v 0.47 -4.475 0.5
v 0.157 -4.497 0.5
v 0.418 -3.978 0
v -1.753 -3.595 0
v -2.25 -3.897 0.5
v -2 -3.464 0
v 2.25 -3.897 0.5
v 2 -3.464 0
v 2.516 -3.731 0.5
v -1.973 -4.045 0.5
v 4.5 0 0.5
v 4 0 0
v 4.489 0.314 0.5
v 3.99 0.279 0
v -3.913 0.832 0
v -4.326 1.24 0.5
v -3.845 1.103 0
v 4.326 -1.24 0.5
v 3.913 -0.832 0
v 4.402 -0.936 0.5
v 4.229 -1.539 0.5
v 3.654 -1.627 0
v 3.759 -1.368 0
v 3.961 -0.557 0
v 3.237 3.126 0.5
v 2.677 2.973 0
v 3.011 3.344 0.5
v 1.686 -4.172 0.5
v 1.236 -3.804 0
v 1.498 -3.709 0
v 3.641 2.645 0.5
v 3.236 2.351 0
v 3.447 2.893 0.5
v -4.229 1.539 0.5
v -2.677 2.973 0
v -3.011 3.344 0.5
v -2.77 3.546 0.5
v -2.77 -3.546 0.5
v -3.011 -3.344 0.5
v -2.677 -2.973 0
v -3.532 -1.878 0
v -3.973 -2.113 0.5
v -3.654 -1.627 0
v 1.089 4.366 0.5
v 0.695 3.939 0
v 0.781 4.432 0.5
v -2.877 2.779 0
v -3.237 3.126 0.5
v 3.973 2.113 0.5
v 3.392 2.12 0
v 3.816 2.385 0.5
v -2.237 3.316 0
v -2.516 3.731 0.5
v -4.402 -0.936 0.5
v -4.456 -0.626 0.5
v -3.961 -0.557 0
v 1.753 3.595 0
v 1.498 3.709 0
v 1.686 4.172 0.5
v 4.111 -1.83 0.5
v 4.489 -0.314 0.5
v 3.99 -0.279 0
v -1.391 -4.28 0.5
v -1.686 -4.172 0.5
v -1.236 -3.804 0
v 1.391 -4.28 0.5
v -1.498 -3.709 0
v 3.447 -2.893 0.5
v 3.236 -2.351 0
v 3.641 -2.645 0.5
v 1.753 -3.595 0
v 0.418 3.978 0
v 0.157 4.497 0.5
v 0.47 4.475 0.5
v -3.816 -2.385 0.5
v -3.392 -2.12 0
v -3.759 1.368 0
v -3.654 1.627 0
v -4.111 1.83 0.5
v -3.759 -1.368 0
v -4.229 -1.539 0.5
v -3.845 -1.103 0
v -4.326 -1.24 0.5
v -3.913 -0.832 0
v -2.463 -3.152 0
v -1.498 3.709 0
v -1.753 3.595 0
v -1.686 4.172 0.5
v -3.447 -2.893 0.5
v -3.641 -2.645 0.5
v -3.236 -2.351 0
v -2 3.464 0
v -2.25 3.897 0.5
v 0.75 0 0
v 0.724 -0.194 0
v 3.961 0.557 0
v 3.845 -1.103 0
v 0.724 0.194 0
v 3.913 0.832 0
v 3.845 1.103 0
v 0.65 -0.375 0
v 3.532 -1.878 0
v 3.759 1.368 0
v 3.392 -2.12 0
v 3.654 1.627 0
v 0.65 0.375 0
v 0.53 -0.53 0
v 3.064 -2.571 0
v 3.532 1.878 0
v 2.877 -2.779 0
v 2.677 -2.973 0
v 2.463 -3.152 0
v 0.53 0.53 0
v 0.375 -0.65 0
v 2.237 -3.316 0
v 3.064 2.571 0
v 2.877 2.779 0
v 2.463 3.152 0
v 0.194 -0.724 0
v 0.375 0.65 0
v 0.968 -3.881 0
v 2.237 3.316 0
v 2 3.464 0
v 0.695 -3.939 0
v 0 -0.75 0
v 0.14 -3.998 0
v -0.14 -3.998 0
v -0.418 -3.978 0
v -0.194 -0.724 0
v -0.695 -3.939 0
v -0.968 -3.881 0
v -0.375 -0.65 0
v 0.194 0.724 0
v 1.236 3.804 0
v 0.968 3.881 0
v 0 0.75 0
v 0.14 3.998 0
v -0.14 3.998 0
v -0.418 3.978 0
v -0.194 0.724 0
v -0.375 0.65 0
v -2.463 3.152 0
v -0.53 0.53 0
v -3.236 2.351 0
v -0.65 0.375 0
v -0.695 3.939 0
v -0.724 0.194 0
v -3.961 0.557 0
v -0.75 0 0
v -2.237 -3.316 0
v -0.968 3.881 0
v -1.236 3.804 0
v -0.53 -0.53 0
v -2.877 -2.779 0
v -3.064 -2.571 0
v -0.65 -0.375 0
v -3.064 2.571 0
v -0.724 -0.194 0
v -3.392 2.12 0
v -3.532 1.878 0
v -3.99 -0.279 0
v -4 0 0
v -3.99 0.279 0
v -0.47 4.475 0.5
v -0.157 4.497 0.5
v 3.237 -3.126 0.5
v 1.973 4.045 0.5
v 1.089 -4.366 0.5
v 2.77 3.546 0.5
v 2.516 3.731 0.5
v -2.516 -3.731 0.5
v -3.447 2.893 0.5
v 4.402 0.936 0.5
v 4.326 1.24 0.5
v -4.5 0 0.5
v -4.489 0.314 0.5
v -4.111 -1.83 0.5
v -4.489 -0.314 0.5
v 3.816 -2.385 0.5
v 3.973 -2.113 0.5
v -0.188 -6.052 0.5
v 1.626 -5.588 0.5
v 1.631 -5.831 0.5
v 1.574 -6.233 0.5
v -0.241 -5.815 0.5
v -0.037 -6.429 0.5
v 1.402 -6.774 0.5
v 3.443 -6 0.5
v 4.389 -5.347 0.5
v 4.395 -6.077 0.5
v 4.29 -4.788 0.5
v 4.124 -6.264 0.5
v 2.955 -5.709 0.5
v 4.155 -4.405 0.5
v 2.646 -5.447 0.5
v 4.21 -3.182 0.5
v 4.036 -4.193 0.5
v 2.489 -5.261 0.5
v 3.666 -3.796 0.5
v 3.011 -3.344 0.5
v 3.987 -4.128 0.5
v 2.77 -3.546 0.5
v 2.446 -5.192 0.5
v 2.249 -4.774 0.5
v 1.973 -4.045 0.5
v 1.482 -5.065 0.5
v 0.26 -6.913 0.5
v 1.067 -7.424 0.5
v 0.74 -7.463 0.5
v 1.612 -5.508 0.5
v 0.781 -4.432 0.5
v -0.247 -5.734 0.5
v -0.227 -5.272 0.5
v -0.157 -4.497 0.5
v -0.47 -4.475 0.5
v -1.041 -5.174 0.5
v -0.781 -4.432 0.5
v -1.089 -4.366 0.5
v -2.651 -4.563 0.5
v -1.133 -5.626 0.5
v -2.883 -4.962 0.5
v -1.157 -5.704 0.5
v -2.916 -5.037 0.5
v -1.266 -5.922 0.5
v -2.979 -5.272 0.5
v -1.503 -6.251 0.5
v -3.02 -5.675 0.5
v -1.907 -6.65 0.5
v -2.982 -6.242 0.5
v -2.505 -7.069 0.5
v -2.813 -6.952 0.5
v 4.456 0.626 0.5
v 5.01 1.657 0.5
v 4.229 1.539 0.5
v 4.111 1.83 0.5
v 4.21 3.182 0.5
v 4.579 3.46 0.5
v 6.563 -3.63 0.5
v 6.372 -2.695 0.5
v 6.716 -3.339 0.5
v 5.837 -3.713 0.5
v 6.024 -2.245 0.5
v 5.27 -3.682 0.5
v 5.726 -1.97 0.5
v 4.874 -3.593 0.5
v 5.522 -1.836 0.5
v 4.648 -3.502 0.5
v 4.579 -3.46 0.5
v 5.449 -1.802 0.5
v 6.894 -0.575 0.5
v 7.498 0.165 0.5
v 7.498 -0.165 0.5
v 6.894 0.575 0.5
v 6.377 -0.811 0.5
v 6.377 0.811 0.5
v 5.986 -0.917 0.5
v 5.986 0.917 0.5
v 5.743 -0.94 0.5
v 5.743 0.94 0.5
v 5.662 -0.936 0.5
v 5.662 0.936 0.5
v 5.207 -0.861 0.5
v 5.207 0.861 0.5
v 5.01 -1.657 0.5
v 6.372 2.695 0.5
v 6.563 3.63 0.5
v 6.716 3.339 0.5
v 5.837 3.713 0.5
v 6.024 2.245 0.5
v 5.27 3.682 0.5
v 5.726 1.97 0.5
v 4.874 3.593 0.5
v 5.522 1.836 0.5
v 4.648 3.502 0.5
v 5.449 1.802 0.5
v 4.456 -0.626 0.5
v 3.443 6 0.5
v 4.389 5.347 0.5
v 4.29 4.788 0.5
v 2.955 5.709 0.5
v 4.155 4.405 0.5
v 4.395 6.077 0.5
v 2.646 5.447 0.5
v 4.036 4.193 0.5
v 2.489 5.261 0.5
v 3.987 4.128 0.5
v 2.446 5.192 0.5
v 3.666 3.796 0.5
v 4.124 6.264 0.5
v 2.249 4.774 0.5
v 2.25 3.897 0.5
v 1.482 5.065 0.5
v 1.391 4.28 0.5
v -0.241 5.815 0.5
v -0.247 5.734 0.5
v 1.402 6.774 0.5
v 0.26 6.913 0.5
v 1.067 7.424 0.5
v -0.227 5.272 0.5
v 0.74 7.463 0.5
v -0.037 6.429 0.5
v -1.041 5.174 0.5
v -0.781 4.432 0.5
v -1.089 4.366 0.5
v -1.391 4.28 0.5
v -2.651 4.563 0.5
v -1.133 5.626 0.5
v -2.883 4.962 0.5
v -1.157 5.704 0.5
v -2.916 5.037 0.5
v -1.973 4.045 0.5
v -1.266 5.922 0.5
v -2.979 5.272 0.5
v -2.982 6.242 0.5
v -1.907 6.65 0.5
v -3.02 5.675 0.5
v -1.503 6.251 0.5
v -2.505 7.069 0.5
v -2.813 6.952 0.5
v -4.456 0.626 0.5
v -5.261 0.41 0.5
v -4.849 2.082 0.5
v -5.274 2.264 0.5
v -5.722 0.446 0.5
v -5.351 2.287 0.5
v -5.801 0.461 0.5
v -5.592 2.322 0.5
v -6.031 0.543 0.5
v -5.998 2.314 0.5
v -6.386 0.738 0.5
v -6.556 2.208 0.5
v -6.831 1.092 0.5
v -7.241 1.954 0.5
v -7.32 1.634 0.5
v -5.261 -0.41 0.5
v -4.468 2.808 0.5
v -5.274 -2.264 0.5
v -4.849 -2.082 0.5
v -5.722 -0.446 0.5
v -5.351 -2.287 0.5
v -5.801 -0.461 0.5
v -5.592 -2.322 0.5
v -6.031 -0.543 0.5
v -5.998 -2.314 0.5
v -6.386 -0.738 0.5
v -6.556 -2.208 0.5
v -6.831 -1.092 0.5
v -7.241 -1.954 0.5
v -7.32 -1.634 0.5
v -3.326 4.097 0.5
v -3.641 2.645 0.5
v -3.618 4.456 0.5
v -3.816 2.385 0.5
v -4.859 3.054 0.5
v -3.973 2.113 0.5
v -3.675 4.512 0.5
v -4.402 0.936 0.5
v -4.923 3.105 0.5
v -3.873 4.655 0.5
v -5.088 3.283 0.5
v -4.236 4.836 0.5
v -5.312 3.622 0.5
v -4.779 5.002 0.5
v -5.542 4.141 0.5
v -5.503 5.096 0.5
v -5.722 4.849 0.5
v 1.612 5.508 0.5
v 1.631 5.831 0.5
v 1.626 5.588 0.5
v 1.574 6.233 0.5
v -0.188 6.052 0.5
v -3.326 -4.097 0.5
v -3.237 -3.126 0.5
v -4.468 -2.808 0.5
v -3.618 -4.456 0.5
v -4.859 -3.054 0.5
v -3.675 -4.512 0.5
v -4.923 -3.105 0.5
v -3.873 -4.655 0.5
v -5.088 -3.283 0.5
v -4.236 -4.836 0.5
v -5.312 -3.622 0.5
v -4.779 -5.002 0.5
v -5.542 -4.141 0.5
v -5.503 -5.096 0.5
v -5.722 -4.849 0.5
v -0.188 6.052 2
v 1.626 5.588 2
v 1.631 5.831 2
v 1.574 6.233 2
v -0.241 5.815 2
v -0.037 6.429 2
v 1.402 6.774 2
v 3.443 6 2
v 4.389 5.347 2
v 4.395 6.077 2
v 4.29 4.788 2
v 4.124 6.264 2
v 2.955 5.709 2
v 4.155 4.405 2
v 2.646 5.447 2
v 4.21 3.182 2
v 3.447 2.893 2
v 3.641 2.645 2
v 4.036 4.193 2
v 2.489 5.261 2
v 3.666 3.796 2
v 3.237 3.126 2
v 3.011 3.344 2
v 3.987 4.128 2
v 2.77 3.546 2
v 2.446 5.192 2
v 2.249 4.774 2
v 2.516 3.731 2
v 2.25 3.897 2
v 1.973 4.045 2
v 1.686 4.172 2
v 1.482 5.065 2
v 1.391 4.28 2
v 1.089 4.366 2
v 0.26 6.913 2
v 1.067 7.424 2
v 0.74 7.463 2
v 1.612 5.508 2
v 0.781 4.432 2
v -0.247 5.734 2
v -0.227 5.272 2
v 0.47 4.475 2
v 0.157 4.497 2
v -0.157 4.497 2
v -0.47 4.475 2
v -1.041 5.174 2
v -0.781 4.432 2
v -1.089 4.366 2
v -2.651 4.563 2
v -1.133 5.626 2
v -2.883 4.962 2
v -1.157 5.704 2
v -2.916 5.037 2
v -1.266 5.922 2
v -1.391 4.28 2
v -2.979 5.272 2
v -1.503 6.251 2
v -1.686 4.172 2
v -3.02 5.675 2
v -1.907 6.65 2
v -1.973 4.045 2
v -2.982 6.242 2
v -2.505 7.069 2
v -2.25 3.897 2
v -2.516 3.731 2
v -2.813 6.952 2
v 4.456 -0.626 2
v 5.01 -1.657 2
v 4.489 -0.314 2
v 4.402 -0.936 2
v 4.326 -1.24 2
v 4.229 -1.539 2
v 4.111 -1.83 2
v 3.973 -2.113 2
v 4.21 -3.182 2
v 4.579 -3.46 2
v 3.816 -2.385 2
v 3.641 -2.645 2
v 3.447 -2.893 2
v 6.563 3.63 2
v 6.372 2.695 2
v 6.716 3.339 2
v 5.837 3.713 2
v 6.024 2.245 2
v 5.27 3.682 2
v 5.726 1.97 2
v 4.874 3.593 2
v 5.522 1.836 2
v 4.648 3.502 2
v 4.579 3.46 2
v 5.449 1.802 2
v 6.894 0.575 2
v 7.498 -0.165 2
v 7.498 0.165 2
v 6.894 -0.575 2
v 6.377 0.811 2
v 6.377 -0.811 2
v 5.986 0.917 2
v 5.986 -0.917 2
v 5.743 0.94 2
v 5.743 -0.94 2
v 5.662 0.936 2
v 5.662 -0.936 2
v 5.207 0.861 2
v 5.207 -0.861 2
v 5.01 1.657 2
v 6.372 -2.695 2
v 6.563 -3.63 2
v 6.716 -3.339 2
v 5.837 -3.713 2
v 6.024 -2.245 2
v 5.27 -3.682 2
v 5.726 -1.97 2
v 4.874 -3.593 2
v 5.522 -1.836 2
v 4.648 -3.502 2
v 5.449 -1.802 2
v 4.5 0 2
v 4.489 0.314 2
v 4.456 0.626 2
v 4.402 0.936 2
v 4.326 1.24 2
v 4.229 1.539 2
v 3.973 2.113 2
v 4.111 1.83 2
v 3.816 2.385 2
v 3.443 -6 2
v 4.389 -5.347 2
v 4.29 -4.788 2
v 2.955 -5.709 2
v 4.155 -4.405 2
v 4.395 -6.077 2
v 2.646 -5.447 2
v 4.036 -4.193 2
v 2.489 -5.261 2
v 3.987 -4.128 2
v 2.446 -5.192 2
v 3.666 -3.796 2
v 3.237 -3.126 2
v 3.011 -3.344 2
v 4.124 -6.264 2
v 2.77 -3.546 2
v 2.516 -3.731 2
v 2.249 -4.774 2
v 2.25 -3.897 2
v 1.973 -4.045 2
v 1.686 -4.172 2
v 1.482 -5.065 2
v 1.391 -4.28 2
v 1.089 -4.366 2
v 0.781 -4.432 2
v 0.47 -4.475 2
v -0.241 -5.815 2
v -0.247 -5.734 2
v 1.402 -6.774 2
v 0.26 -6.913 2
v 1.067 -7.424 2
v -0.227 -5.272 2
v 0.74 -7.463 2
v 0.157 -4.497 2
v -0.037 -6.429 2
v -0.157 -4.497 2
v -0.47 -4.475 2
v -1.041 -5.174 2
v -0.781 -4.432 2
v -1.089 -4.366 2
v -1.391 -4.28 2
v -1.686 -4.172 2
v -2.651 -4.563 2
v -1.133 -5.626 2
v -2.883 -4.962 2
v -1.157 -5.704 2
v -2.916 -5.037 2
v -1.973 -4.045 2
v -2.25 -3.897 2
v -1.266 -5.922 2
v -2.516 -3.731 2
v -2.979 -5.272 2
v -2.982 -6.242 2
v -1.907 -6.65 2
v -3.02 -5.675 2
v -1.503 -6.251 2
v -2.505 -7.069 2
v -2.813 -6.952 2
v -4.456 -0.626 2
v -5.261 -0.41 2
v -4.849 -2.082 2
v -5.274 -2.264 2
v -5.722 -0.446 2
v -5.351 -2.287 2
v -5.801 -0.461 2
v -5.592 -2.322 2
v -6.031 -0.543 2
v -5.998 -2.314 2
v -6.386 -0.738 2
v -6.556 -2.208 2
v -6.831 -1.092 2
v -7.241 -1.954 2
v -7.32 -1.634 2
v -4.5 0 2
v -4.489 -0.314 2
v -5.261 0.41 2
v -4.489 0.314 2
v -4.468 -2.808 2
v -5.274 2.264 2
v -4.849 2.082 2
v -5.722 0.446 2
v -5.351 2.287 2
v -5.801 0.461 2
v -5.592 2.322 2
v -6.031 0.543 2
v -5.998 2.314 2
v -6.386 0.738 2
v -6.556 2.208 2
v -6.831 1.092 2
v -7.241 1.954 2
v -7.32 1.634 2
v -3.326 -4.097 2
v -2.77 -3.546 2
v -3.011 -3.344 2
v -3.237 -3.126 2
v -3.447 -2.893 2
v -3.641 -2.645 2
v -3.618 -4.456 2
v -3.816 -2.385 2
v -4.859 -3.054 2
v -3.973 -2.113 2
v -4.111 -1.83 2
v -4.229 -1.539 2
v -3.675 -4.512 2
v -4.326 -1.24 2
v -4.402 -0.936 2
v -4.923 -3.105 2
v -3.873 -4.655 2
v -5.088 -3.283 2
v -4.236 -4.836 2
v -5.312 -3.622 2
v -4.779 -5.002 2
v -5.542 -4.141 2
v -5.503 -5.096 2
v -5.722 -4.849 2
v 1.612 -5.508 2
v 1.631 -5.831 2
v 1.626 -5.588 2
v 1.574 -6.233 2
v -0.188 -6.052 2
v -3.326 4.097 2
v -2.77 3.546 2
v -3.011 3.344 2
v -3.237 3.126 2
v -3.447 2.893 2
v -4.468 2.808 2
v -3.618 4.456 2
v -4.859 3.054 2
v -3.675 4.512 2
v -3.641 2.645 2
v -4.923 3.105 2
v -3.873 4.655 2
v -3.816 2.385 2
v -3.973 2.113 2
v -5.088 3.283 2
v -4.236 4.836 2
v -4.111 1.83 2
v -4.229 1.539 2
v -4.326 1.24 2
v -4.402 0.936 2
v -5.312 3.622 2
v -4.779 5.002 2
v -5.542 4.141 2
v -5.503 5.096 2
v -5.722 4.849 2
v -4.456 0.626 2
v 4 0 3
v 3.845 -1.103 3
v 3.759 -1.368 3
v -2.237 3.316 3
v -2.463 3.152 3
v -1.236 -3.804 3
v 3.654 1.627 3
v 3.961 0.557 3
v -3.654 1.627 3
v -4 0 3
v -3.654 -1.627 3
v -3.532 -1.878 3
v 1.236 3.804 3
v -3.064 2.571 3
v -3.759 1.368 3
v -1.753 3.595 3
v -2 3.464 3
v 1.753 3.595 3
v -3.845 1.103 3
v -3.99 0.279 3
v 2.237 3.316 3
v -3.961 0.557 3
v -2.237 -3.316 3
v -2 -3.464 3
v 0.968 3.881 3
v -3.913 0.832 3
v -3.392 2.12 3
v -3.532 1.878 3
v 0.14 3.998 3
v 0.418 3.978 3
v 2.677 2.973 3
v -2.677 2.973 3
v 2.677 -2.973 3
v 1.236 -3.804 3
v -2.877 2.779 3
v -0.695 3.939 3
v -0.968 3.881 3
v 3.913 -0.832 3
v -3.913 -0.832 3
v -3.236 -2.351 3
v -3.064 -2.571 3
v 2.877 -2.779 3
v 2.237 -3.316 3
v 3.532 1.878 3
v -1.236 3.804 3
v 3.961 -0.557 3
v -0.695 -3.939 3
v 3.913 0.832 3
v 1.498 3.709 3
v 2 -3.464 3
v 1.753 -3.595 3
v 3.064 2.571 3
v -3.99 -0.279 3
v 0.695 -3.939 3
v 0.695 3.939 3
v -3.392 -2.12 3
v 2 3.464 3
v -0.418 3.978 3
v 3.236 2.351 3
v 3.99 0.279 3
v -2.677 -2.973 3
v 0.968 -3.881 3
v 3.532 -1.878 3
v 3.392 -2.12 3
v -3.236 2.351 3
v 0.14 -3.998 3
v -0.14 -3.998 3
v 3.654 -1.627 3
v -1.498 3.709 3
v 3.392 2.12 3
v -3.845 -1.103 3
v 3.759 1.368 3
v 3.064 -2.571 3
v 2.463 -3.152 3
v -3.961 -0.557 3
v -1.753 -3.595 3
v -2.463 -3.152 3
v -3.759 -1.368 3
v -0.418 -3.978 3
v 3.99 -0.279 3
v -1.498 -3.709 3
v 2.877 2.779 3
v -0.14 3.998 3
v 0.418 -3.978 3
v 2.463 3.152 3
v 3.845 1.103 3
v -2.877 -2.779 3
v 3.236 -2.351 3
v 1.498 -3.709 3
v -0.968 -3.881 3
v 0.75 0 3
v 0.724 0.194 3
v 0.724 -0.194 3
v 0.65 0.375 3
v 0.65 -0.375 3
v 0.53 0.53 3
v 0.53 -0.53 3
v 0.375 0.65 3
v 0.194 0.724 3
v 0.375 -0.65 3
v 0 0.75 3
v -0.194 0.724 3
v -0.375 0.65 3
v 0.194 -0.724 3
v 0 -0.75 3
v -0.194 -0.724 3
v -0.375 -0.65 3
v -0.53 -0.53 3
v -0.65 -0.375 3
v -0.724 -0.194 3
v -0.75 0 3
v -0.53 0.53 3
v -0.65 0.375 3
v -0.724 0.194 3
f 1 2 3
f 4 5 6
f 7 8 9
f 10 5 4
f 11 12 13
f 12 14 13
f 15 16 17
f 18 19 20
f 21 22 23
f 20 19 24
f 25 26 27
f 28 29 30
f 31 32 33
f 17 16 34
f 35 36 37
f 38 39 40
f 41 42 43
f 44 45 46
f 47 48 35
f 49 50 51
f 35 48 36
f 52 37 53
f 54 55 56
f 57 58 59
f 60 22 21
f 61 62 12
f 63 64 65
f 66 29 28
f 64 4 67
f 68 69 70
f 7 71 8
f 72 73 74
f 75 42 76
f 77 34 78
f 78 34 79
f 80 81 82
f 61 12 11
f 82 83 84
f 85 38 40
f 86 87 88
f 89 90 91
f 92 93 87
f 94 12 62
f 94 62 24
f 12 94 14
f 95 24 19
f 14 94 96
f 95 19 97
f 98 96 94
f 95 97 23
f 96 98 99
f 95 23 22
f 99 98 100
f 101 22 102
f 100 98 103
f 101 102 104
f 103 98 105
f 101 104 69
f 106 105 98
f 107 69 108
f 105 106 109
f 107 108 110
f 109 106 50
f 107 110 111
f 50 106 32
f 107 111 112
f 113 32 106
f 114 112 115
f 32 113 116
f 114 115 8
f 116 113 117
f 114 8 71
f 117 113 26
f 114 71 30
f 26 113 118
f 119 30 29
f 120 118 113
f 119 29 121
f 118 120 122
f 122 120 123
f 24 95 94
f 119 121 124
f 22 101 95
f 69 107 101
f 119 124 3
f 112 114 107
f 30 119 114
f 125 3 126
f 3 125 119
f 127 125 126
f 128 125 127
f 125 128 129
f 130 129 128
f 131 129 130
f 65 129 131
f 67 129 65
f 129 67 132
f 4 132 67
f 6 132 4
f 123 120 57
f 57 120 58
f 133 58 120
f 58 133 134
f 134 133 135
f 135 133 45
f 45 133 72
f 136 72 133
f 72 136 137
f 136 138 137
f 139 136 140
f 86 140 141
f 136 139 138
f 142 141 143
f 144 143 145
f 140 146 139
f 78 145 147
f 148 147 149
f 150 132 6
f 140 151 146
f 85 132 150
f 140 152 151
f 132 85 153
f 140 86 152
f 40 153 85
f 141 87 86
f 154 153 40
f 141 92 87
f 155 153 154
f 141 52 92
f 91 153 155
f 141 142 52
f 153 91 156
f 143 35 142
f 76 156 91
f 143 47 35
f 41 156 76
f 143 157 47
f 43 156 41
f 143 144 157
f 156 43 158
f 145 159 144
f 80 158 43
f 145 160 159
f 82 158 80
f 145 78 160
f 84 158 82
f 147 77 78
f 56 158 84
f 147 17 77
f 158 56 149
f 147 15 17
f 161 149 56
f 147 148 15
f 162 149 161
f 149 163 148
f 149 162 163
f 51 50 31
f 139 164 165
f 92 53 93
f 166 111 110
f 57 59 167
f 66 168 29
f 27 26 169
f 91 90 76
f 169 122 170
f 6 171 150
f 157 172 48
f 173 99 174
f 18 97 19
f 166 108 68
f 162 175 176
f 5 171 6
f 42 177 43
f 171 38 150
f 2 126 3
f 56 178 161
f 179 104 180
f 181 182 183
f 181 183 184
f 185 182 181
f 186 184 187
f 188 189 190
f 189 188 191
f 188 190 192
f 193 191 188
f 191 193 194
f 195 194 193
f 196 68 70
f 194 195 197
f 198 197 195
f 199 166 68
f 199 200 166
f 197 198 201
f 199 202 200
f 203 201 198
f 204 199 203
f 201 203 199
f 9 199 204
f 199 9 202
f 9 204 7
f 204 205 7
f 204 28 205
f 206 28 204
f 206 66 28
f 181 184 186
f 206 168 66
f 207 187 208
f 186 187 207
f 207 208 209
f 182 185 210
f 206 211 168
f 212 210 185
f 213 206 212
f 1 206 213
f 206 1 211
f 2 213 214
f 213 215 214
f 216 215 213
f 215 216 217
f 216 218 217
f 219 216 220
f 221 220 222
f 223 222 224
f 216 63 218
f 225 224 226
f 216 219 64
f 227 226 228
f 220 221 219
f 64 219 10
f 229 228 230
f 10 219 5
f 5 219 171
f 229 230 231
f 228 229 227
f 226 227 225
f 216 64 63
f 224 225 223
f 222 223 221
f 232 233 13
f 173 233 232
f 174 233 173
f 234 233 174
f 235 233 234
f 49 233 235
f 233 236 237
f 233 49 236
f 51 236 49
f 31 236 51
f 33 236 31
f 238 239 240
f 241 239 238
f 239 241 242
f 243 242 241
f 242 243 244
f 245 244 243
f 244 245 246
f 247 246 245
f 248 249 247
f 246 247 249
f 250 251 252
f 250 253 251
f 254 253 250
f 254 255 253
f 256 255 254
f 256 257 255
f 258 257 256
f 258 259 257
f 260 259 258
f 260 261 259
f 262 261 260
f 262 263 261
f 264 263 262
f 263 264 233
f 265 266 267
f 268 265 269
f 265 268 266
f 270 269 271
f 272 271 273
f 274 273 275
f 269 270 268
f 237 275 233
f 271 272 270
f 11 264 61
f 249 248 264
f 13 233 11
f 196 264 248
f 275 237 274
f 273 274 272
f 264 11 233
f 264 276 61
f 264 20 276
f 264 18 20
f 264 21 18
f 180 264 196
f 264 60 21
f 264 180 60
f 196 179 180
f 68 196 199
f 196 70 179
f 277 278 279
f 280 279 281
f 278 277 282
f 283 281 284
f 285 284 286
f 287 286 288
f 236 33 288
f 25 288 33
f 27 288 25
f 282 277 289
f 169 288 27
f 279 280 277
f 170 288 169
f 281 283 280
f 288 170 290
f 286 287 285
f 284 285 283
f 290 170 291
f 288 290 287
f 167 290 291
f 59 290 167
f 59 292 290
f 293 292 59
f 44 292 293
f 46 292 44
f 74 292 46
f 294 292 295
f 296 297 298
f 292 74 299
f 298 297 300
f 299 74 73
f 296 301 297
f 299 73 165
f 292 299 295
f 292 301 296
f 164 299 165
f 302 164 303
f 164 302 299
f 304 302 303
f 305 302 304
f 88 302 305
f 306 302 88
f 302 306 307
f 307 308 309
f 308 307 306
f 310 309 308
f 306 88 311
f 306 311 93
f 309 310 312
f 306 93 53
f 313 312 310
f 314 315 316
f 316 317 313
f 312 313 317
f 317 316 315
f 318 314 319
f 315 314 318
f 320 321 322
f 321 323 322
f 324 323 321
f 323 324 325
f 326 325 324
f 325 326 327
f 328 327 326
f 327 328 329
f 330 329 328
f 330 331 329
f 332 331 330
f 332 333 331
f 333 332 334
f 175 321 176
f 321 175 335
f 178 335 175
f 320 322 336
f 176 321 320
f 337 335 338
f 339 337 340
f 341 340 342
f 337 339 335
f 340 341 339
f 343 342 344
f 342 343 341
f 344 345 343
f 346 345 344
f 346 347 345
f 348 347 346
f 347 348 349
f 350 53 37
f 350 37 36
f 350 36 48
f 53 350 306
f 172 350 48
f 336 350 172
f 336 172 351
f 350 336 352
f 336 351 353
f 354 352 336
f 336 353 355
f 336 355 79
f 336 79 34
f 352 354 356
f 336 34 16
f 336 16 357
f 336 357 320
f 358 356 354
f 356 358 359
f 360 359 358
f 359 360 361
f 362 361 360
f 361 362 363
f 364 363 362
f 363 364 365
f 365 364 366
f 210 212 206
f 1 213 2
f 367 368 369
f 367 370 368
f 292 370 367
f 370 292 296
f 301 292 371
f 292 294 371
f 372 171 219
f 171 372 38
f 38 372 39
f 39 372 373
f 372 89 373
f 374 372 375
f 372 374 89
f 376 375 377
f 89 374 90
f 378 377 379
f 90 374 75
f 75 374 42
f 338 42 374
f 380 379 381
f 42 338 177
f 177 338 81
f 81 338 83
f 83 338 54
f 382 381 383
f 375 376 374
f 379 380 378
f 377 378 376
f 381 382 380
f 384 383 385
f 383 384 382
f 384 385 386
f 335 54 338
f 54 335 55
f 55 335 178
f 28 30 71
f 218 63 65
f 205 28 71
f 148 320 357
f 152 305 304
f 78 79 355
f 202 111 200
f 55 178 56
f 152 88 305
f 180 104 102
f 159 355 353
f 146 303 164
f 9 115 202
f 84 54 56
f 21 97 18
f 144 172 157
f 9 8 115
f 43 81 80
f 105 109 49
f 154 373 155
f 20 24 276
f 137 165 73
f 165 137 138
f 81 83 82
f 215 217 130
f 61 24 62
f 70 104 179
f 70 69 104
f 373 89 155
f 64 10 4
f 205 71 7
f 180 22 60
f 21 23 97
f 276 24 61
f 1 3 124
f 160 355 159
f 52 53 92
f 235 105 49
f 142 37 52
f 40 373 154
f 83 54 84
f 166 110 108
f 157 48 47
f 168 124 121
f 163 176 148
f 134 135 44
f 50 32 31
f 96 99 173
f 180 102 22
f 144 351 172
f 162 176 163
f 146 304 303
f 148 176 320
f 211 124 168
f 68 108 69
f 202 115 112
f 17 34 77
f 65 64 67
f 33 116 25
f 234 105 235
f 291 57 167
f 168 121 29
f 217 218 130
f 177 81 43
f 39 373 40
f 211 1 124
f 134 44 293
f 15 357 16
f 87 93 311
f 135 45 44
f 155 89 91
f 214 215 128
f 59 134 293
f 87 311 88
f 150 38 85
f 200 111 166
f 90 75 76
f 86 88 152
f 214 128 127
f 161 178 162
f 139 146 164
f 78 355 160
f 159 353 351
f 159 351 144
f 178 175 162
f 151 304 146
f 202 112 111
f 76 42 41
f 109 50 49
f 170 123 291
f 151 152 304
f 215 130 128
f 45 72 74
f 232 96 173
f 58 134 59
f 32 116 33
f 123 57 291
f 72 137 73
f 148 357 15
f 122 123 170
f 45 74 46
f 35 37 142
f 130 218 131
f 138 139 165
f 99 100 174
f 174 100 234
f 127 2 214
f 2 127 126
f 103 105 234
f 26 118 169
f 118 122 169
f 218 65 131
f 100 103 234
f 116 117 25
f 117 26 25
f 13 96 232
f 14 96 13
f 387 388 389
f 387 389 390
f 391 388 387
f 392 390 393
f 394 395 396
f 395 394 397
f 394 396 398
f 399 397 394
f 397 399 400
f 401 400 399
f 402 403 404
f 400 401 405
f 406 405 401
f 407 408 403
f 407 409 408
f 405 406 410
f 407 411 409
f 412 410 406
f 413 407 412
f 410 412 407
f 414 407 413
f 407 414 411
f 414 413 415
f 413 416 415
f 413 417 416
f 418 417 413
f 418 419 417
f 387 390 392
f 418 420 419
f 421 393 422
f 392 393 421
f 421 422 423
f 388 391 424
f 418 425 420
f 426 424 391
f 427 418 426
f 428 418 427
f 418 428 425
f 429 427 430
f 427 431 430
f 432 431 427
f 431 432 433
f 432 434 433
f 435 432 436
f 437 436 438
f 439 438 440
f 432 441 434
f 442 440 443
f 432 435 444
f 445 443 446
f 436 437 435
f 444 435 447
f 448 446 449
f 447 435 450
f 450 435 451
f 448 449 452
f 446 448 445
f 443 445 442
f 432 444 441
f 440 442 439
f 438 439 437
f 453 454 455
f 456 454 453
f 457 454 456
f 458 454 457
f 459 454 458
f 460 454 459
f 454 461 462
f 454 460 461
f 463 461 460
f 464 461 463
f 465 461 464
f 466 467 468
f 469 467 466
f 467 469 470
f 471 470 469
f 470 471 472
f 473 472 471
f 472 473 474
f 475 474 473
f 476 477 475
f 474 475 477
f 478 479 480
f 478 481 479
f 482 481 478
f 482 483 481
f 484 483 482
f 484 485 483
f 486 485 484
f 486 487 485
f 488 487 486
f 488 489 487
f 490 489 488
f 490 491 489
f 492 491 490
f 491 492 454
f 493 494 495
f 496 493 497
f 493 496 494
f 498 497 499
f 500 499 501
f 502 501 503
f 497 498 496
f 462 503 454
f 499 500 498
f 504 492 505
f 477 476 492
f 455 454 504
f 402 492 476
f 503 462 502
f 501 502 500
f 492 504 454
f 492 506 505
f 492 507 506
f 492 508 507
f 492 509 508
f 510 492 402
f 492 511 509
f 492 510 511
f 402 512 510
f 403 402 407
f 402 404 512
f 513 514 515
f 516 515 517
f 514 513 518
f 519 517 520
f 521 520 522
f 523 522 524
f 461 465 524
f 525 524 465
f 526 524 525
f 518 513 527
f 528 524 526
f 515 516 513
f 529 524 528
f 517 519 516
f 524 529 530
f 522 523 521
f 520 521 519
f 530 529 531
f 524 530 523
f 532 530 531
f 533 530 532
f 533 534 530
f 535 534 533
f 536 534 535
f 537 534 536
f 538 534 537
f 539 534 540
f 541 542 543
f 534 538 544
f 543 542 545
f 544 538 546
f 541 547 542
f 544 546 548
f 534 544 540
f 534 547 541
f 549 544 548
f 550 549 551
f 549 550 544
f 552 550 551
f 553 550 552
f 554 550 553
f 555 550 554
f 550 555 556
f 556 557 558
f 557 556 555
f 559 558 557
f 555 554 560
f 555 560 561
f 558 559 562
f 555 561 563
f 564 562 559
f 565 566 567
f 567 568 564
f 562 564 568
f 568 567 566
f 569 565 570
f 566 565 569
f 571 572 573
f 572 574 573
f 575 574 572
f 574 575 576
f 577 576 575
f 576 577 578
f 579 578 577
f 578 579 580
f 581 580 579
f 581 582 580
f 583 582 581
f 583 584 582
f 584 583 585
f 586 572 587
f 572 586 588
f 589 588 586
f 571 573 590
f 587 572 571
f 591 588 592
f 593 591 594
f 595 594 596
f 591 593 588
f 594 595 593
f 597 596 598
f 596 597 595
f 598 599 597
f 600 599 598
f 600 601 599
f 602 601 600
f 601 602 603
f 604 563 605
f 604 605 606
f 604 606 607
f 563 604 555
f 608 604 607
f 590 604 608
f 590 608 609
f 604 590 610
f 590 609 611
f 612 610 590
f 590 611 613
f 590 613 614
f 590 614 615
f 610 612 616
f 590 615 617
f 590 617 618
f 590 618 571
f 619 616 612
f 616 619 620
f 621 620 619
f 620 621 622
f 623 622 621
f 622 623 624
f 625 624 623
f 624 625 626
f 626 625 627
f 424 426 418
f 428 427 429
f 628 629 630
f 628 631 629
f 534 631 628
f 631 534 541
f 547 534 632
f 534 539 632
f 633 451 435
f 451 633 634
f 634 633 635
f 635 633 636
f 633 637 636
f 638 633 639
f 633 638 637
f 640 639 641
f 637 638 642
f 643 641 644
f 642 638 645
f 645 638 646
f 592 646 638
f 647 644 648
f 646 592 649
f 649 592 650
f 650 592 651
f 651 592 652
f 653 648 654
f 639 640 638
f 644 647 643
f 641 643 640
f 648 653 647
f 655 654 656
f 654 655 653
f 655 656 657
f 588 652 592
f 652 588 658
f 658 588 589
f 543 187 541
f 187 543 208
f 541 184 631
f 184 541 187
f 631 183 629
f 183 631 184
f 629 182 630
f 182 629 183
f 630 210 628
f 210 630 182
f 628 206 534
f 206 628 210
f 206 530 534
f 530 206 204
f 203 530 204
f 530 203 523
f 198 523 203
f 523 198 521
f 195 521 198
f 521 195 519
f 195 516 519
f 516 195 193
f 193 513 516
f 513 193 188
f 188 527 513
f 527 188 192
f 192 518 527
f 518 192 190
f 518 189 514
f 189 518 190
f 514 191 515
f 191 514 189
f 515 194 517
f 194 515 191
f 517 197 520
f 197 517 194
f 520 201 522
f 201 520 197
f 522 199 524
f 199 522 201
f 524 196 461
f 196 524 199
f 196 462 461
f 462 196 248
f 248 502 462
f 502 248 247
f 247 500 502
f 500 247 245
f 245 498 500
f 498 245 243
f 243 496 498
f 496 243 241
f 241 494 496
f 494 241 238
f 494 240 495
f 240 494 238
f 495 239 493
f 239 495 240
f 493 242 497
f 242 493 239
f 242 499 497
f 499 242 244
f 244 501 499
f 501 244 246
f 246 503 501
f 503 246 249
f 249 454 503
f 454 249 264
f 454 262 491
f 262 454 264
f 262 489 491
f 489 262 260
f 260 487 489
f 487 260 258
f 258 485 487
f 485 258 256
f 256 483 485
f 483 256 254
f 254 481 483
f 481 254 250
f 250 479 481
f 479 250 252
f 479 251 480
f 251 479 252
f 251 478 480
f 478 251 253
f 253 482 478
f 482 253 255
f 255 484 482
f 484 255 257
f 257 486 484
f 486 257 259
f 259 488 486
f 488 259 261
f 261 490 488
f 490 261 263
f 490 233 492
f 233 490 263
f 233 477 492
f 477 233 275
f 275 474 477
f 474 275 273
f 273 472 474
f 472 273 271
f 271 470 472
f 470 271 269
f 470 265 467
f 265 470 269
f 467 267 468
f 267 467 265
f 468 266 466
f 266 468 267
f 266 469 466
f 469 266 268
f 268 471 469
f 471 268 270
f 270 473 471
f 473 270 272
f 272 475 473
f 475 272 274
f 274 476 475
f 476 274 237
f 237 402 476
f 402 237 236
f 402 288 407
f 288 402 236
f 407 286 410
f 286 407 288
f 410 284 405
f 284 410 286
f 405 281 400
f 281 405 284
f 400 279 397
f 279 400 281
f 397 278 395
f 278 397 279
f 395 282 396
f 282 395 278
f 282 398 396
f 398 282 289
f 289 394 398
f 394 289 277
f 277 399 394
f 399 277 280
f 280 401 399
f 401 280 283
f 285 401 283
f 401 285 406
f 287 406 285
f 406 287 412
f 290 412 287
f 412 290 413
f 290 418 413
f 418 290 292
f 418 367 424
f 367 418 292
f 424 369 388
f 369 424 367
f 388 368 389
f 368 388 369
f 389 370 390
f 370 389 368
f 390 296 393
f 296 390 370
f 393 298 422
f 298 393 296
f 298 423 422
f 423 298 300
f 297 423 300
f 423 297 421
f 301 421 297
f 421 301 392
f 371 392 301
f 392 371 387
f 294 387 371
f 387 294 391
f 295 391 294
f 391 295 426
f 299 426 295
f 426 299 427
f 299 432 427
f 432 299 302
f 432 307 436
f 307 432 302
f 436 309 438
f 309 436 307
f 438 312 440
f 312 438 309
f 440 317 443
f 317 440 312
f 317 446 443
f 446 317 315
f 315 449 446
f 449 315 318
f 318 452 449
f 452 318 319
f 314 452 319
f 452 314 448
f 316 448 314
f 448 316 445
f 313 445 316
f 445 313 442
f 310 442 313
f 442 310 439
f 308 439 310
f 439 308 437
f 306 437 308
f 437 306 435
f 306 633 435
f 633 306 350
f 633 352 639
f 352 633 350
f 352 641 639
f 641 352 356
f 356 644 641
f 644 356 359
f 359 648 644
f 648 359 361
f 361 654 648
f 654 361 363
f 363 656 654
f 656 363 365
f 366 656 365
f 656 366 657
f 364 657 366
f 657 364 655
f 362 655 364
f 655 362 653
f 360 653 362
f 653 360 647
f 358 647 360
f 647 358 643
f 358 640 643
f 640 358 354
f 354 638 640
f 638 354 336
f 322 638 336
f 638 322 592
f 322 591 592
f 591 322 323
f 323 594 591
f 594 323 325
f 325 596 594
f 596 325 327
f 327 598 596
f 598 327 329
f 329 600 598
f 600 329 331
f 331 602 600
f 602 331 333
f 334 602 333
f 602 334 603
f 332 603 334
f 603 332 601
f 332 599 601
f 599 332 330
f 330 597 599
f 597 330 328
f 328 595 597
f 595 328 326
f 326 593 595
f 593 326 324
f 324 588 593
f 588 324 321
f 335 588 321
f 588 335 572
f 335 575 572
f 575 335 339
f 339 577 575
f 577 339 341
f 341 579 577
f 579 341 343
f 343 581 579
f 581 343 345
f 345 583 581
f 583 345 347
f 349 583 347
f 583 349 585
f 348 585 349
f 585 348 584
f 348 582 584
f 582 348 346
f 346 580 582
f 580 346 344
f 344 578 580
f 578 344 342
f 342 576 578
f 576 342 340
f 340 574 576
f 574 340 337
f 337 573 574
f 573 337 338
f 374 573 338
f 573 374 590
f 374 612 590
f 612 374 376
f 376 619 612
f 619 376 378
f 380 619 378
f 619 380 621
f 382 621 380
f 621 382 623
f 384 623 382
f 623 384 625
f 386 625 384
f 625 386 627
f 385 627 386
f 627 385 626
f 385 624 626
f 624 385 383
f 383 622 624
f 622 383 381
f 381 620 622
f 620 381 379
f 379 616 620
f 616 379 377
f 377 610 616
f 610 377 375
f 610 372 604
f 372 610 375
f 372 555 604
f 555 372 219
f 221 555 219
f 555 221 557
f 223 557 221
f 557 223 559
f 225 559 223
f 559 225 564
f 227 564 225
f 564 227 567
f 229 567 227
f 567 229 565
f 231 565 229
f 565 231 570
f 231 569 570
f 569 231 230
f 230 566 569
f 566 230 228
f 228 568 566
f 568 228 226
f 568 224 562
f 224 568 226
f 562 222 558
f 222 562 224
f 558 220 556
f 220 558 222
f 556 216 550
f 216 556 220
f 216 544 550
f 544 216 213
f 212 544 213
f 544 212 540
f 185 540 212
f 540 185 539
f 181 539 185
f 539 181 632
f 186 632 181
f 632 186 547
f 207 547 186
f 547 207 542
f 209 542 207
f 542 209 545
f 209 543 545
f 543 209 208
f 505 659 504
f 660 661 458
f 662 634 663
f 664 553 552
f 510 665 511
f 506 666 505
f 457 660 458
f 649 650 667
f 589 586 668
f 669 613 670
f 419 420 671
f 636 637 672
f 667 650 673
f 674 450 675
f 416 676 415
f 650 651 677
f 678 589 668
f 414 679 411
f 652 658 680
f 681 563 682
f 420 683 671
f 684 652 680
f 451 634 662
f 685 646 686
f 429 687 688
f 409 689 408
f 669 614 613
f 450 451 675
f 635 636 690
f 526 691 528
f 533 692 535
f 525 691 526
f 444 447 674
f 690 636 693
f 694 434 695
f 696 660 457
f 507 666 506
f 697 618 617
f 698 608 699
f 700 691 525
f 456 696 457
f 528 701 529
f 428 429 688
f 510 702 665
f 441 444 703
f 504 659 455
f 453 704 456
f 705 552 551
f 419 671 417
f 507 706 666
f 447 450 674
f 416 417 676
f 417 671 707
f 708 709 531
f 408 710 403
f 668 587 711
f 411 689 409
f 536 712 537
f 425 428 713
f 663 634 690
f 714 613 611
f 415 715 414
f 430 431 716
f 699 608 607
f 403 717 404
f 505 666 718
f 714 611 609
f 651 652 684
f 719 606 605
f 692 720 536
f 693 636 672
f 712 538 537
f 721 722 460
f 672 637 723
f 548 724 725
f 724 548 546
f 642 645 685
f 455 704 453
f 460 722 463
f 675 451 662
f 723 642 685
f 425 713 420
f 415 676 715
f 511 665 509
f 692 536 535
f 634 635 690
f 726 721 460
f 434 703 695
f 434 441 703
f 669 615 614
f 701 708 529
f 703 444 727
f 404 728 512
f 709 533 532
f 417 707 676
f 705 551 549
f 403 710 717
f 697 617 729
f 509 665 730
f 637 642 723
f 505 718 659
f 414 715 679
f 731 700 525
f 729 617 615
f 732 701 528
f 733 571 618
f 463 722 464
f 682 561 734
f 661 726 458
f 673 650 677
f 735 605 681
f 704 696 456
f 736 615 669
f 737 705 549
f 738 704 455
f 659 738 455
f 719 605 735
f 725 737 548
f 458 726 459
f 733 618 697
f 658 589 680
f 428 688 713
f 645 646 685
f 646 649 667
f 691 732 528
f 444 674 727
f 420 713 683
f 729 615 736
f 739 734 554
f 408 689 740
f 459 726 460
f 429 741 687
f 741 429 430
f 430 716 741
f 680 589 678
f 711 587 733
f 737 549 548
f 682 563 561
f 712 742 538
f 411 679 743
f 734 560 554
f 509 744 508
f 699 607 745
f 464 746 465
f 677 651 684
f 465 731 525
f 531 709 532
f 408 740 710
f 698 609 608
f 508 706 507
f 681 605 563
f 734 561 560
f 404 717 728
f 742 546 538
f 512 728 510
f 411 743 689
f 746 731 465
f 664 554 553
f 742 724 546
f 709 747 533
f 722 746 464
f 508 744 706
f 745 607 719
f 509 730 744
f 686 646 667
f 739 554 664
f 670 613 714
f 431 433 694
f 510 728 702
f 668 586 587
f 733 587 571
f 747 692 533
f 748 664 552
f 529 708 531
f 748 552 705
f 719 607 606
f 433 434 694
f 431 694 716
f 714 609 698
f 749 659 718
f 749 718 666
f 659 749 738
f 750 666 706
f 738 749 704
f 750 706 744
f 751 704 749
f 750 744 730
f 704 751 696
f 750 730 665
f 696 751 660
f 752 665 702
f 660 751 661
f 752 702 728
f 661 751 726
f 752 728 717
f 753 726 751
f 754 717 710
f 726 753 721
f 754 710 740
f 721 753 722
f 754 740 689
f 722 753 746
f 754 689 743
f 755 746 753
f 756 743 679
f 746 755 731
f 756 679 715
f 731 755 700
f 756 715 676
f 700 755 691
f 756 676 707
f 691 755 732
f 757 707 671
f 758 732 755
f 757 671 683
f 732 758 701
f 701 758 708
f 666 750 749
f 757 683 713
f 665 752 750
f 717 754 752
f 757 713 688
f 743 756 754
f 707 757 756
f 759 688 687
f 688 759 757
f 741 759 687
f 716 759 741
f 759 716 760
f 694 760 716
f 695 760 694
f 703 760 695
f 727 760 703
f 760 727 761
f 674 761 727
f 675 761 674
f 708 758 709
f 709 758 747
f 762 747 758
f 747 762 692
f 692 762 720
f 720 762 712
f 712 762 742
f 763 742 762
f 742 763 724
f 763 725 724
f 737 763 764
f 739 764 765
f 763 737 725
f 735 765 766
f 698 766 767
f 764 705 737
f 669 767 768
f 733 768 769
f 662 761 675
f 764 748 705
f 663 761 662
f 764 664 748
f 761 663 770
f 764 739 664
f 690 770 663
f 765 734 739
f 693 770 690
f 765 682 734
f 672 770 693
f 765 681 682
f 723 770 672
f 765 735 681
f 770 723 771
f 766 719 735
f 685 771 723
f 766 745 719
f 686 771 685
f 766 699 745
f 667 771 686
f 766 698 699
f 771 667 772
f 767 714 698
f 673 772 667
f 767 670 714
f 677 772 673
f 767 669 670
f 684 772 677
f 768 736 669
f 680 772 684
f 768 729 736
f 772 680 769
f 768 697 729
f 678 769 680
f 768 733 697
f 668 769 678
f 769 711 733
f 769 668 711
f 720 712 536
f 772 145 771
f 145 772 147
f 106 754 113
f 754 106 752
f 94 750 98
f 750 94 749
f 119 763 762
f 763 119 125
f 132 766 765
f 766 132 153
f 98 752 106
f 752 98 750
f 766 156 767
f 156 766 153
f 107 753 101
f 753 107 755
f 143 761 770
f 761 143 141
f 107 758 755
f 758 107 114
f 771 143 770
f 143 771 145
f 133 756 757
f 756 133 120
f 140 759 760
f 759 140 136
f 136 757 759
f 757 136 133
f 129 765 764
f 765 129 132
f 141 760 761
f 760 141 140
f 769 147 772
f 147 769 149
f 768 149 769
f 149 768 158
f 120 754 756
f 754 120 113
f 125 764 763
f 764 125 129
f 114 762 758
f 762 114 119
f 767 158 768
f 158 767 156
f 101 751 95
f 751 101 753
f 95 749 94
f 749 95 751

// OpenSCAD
// file: inc/bevel_lib.scad
// Bevelled boxes, etc
module roundedbox(size=[1.0, 1.0, 1.0, ], radius = 0.1) {
    hull() {
        for (x = [radius, size[0] - radius]) {
            for (y = [radius, size[1] - radius]) {
                for (z = [radius, size[2] - radius]) {
                    translate([x,y,z])
                        sphere(r=radius);
                }
            }
        }
    }
}

module rounded_square_centered(size=[1,1], radius=0.1) {
    hull() {
        for (x = [- size[0] / 2 + radius, size[0] / 2 - radius]) {
            for (y = [- size[1] / 2 + radius, size[1] / 2 - radius]) {
                translate([x,y]) circle(radius);
            }
        }
    }
}

module bevelled_square(size=[1,1], radius=0.1) {
    polygon(points=[
            // Left
            [0, radius ],
            [0, size[1] - radius ],
            // Top
            [radius, size[1]],
            [size[0] - radius, size[1]],
            // Right
            [size[0], size[1] - radius],
            [size[0], radius],
            // Bot
            [size[0] -radius, 0],
            [radius, 0]
        ]);
}

// Bevelled in x and y axes.
module bevelledbox(size=[1,1,1], radius=0.1) {
    linear_extrude(height=size[2]) {
        // 8-sided polygon
        polygon(points=[
            // Left
            [0, radius ],
            [0, size[1] - radius ],
            // Top
            [radius, size[1]],
            [size[0] - radius, size[1]],
            // Right
            [size[0], size[1] - radius],
            [size[0], radius],
            // Bot
            [size[0] -radius, 0],
            [radius, 0]
            ]);
    }
}

module bevelledbox_y(size=[1,1,1], radius=0.1) {
    // Bevelled around y
    translate([0,0,size[2]])
        rotate(-90, [1,0,0])
            bevelledbox([size[0], size[2], size[1]], radius); 
}

module bevelledbox_x(size=[1,1,1], radius=0.1) {
    // Bevelled around x
    translate([size[0],0,0])
        rotate(-90, [0,1,0])
            bevelledbox([size[2], size[1], size[0]], radius); 
}

// Draw origin-centred, unit polyhedron.
module octahedron(C0=1.0) {
    polyhedron(points = [
        [0.0, 0.0,  C0],
        [0.0, 0.0, -C0],
        [ C0, 0.0, 0.0],
        [-C0, 0.0, 0.0],
        [0.0,  C0, 0.0],
        [0.0, -C0, 0.0]
        ],
        faces = [
[ 4 , 2, 0],
[ 3 , 4, 0],
[ 5 , 3, 0],
[ 2 , 5, 0],
[ 5 , 2, 1],
[ 3 , 5, 1],
[ 4 , 3, 1],
[ 2 , 4, 1]
        ]
    );
}

module fullybevelledbox(size=[1,1,1], radius=0.1) {
    hull() {
        for (x = [radius, size[0] - radius]) {
            for (y = [radius, size[1] - radius]) {
                for (z = [radius, size[2] - radius]) {
                    translate([x,y,z])
                        octahedron(radius);
                }
            }
        }
    }
}
// file: inc/utils.scad
// 2d polyline, circles connected by segments.
// Points is an array of arrays with a minimum of 2 elements.
module polyline(points, radius)
{
    polyline_hulls(points) {
        circle(radius);
    }
}

// Do a polyline, by making hulls between each pair of points
// and duplicating children() at those points...
module polyline_hulls(points) {
    for (i=[0:len(points)-2]) {
        p1 = points[i];
        p2 = points[i+1];
        hull() {
            translate(p1) children();
            translate(p2) children();
        }
    }    
}

module mirror_x()
{
    union() {
        children();
        mirror([1,0,0]) children();
    }
}

module mirror_y()
{
    union() {
        children();
        mirror([0,1,0]) children();
    }
}

module mirror_z()
{
    union() {
        children();
        mirror([0,0,1]) children();
    }
}

// Draw origin-centred, unit polyhedron.
module octahedron(C0=1.0) {
    polyhedron(points = [
        [0.0, 0.0,  C0],
        [0.0, 0.0, -C0],
        [ C0, 0.0, 0.0],
        [-C0, 0.0, 0.0],
        [0.0,  C0, 0.0],
        [0.0, -C0, 0.0]
        ],
        faces = [
[ 4 , 2, 0],
[ 3 , 4, 0],
[ 5 , 3, 0],
[ 2 , 5, 0],
[ 5 , 2, 1],
[ 3 , 5, 1],
[ 4 , 3, 1],
[ 2 , 4, 1]
        ]
    );
}

module diamond(C0=1.0) {
    rotate([0,0,45])
        square([C0 * sqrt(2), C0 * sqrt(2)], center=true);
}

// Rounded rectangle, centred.
module rounded_rect(w,h,r)
{
    hull() {
        translate([(-w / 2) + r, (-h / 2) + r])
            circle(r);
        translate([(w / 2) - r, (-h / 2) + r])
            circle(r);
        translate([(-w / 2) + r, (h / 2) - r])
            circle(r);
        translate([(w / 2) - r, (h / 2) - r])
            circle(r);
    }
}
// file: n20.scad
/*
 * N20 gear motor
 */

$fs = 0.4; // millimetres; smallest segment

motor_w = 16; // Width of motor (x axis)
motor_h = 10; // motor height
motor_d = 12; // y
gearbox_h = 10.6;
gearbox_d = 12;
gearbox_w = 10;
 
module n20_motor(margin=0.2)
{
    motor_d_half = motor_d / 2;
    motor_w_half = motor_w / 2;
    gearbox_w_half = gearbox_w / 2;
    // Oval motor body
    curve_rad = 10;
    translate([-motor_w_half - gearbox_w,0,0])
    rotate([0,90,0]) {
        $fa = 5.0; // more polygons?
        linear_extrude(motor_w, center=true) {
            intersection() {
            
                translate([0, motor_d_half - curve_rad - margin])
                    circle(r=curve_rad);
                translate([0, -motor_d_half + curve_rad + margin])
                    circle(r=curve_rad);
                square([motor_h,motor_d + (margin*2)], center=true);
            }
        }
    }
    // Cube gearbox
    translate([- gearbox_w_half, 0,0]) {
        cube([ gearbox_w + 0.1 + (margin*2), gearbox_d, gearbox_h], center=true); 
    }
    // Shaft
    translate([0,0,0]) {
        rotate([0,90,0]) {
            cylinder(h=10, r=1.5);
        }
    }
}

module n20_motor_top_ext(back_part=6.0) {
    // Motor with a box on top
    // And a cylinder out the back.
    n20_motor();
    translate([-motor_w-gearbox_w, -(motor_d/2), motor_h/2 - 0.2])
        cube([motor_w+gearbox_w, gearbox_d, gearbox_h]);
        
    // This is a cutout for wiring, terminals etc
    back_x = -motor_w-gearbox_w - back_part;
    translate([back_x, -(motor_d/2) + 1, -motor_h/2 + 2]) {
        cube([back_part + 0.2, motor_d - 2, motor_h + 0.2]);
    }
}

n20_motor();
// file: shell.scad
use <n20.scad>;
use <inc/utils.scad>;
use <inc/bevel_lib.scad>;

$fs = 0.6; // millimetres

shell_w = 80;
shell_d = 80;
shell_h = 16;

drive_motor_y = 23;
flip_motor_y = -31;

front_slope = 12;
rear_slope = 0; // Set this to slope the rear backwards

shell_d_half = shell_d / 2;
shell_w_half = shell_w / 2;

module mirror_xy() {
    mirror_x() {
        mirror_y() {
            children();
        }
    }
}

module side_outline() {
    // Make the quad for the main shape
    // 2d, centred on the x axis
    polygon(
        [
            [-shell_d_half, 0],
            [-shell_d_half - rear_slope, shell_h],
            [shell_d_half - front_slope, shell_h],
            [shell_d_half, 0]
        ]
        );
}

module motor_cutouts() {
    mirror_x() {
        // Drive motors
        translate([shell_w_half,drive_motor_y,shell_h/2]) {
            n20_motor_top_ext();
        }
        // Flip motors - these point inwards.
        translate([-10,flip_motor_y,shell_h/2]) {
            n20_motor_top_ext(back_part=3.0);        
        }
    }
}

module lid_cutout() {
    translate( [0,0,(shell_h * 1.5) - 2]) {
        cube([shell_w - 4, shell_d - 4, shell_h], center=true);
    }
}

module other_cutouts() {
    // Cutouts: Battery / gubbins compartment
    // fullybevelledbox is not centred.
    mirror_x() {
        translate([2, -24, 1 + 0.4])
            fullybevelledbox([31.5,39, shell_h -3], radius=1.0);
    }
    // Wiring cutouts
    // Lengthwise cutout
    translate([-1.25,-shell_d_half + 3, 9])
        fullybevelledbox([2.5, shell_d - 10, shell_h], radius=1.0);
    // Cutout for the flipper axle etc
    cutout_axle_depth = 9;
    translate([-11, flip_motor_y - (cutout_axle_depth/2), shell_h - 12.5])
        fullybevelledbox([22, cutout_axle_depth, shell_h], radius=1.0);
    // Cutout for the flipper axle bits
    translate([-6, flip_motor_y - 8, 2])
        fullybevelledbox([12, 15, shell_h], radius=1.0);
    // Cut out the rear
    translate([0, -shell_d_half, shell_h])
        cube([22,5,4], center=true);
}

screw_locations = [
    [5, shell_d_half - 15], 
    [shell_w_half - 5, -shell_d_half + 24],
    [shell_w_half - 5, -shell_d_half + 42],
    [8, -shell_d_half + 2.5]
];

module screw_holes() {
    // We could use M2 bolts, self tappers or something else.
    r=1.2;
    mirror_x() {
        for (location = screw_locations) {
            translate(location)
                cylinder(r=r, h=shell_h +25);
        }
    }
}
// Centred cylinder in the x axis
module cylinder_x(r, len)
{
    rotate([0,90,0]) {
        cylinder(h=len, r=r, center=true);
    }
}

module axle_holes() {
    wheel_holes_y = [-6, -35];
    idle_holes_y = [8.5,-20];
    shell_h_half = shell_h/2;
    mirror_x() {
        // These are holes for M3 bolts which will be the axles
        // (wheels have bearings)
        for (y = wheel_holes_y) {
            translate([shell_w_half, y, shell_h_half]) 
                cylinder_x(1.7, 20);
            // Need a cutout for the bolt heads
            translate([shell_w_half-2 - 3, y, shell_h_half]) 
                cylinder_x(3.0, 6);
            
        }
        // These are smaller holes for idler gears which don't carry weight
        for (y = idle_holes_y) {
            translate([shell_w_half, y, shell_h_half]) 
                cylinder_x(0.8, 20);
        }
    }
}

module wiring_channels() {
    // Cutout from one side of the gubbins section to the other
    // (for power wires etc)
    translate([-10,9,shell_h-12])
        fullybevelledbox([20,4,9], radius=1.5);
    
    // Cutouts from the gubbins to the front (drive) motors
    // Which have their wiring near the centre.
    mirror_x() {
        translate([6,12,shell_h-12])
            fullybevelledbox([4,8,9], radius=1.5);
        
    }
    // Cutouts to allow wires to weapon motors
    // Which have their wiring very near the edge.
    mirror_x() {
        translate([shell_w_half-5,flip_motor_y+3,shell_h-6])
            fullybevelledbox([3,9,9], radius=1.5);
        translate([shell_w_half-8,flip_motor_y+8,shell_h-6])
            fullybevelledbox([6,4,9], radius=1.5);
        
    }    
}

module main()
{
    difference() {
        rotate([0,0,90])
        rotate([90,0,0])
            linear_extrude(height=shell_w, center=true) {
                side_outline();
            }
        motor_cutouts();
        lid_cutout();
        other_cutouts();
        screw_holes();
        axle_holes();
        wiring_channels();
    }
}

main();
// main file
use <shell.scad>;
use <MCAD/involute_gears.scad>;

$fs = 0.2; // millimetres
$fa = 4; // deg

drive_motor_y = 23;

CP=180;
GEARWHEEL_COUNT=16;
IDLE_COUNT=13;

module main() {
    difference() {
        union() {
            cylinder(r1=4,r2=4.5,h=0.5);
            translate([0,0,0.5])
            linear_extrude(height=1.5, convexity=4) {
                gear(number_of_teeth=IDLE_COUNT,
                    circular_pitch = CP, flat=true,
                    bore_diameter=0);    
            }
            translate([0,0,2.0])
            cylinder(r1=4.5,r2=4,h=1.0);
        }
        // hole
        translate([0,0,-1])
            cylinder(r=0.75, h=10);
    }
}

main();
